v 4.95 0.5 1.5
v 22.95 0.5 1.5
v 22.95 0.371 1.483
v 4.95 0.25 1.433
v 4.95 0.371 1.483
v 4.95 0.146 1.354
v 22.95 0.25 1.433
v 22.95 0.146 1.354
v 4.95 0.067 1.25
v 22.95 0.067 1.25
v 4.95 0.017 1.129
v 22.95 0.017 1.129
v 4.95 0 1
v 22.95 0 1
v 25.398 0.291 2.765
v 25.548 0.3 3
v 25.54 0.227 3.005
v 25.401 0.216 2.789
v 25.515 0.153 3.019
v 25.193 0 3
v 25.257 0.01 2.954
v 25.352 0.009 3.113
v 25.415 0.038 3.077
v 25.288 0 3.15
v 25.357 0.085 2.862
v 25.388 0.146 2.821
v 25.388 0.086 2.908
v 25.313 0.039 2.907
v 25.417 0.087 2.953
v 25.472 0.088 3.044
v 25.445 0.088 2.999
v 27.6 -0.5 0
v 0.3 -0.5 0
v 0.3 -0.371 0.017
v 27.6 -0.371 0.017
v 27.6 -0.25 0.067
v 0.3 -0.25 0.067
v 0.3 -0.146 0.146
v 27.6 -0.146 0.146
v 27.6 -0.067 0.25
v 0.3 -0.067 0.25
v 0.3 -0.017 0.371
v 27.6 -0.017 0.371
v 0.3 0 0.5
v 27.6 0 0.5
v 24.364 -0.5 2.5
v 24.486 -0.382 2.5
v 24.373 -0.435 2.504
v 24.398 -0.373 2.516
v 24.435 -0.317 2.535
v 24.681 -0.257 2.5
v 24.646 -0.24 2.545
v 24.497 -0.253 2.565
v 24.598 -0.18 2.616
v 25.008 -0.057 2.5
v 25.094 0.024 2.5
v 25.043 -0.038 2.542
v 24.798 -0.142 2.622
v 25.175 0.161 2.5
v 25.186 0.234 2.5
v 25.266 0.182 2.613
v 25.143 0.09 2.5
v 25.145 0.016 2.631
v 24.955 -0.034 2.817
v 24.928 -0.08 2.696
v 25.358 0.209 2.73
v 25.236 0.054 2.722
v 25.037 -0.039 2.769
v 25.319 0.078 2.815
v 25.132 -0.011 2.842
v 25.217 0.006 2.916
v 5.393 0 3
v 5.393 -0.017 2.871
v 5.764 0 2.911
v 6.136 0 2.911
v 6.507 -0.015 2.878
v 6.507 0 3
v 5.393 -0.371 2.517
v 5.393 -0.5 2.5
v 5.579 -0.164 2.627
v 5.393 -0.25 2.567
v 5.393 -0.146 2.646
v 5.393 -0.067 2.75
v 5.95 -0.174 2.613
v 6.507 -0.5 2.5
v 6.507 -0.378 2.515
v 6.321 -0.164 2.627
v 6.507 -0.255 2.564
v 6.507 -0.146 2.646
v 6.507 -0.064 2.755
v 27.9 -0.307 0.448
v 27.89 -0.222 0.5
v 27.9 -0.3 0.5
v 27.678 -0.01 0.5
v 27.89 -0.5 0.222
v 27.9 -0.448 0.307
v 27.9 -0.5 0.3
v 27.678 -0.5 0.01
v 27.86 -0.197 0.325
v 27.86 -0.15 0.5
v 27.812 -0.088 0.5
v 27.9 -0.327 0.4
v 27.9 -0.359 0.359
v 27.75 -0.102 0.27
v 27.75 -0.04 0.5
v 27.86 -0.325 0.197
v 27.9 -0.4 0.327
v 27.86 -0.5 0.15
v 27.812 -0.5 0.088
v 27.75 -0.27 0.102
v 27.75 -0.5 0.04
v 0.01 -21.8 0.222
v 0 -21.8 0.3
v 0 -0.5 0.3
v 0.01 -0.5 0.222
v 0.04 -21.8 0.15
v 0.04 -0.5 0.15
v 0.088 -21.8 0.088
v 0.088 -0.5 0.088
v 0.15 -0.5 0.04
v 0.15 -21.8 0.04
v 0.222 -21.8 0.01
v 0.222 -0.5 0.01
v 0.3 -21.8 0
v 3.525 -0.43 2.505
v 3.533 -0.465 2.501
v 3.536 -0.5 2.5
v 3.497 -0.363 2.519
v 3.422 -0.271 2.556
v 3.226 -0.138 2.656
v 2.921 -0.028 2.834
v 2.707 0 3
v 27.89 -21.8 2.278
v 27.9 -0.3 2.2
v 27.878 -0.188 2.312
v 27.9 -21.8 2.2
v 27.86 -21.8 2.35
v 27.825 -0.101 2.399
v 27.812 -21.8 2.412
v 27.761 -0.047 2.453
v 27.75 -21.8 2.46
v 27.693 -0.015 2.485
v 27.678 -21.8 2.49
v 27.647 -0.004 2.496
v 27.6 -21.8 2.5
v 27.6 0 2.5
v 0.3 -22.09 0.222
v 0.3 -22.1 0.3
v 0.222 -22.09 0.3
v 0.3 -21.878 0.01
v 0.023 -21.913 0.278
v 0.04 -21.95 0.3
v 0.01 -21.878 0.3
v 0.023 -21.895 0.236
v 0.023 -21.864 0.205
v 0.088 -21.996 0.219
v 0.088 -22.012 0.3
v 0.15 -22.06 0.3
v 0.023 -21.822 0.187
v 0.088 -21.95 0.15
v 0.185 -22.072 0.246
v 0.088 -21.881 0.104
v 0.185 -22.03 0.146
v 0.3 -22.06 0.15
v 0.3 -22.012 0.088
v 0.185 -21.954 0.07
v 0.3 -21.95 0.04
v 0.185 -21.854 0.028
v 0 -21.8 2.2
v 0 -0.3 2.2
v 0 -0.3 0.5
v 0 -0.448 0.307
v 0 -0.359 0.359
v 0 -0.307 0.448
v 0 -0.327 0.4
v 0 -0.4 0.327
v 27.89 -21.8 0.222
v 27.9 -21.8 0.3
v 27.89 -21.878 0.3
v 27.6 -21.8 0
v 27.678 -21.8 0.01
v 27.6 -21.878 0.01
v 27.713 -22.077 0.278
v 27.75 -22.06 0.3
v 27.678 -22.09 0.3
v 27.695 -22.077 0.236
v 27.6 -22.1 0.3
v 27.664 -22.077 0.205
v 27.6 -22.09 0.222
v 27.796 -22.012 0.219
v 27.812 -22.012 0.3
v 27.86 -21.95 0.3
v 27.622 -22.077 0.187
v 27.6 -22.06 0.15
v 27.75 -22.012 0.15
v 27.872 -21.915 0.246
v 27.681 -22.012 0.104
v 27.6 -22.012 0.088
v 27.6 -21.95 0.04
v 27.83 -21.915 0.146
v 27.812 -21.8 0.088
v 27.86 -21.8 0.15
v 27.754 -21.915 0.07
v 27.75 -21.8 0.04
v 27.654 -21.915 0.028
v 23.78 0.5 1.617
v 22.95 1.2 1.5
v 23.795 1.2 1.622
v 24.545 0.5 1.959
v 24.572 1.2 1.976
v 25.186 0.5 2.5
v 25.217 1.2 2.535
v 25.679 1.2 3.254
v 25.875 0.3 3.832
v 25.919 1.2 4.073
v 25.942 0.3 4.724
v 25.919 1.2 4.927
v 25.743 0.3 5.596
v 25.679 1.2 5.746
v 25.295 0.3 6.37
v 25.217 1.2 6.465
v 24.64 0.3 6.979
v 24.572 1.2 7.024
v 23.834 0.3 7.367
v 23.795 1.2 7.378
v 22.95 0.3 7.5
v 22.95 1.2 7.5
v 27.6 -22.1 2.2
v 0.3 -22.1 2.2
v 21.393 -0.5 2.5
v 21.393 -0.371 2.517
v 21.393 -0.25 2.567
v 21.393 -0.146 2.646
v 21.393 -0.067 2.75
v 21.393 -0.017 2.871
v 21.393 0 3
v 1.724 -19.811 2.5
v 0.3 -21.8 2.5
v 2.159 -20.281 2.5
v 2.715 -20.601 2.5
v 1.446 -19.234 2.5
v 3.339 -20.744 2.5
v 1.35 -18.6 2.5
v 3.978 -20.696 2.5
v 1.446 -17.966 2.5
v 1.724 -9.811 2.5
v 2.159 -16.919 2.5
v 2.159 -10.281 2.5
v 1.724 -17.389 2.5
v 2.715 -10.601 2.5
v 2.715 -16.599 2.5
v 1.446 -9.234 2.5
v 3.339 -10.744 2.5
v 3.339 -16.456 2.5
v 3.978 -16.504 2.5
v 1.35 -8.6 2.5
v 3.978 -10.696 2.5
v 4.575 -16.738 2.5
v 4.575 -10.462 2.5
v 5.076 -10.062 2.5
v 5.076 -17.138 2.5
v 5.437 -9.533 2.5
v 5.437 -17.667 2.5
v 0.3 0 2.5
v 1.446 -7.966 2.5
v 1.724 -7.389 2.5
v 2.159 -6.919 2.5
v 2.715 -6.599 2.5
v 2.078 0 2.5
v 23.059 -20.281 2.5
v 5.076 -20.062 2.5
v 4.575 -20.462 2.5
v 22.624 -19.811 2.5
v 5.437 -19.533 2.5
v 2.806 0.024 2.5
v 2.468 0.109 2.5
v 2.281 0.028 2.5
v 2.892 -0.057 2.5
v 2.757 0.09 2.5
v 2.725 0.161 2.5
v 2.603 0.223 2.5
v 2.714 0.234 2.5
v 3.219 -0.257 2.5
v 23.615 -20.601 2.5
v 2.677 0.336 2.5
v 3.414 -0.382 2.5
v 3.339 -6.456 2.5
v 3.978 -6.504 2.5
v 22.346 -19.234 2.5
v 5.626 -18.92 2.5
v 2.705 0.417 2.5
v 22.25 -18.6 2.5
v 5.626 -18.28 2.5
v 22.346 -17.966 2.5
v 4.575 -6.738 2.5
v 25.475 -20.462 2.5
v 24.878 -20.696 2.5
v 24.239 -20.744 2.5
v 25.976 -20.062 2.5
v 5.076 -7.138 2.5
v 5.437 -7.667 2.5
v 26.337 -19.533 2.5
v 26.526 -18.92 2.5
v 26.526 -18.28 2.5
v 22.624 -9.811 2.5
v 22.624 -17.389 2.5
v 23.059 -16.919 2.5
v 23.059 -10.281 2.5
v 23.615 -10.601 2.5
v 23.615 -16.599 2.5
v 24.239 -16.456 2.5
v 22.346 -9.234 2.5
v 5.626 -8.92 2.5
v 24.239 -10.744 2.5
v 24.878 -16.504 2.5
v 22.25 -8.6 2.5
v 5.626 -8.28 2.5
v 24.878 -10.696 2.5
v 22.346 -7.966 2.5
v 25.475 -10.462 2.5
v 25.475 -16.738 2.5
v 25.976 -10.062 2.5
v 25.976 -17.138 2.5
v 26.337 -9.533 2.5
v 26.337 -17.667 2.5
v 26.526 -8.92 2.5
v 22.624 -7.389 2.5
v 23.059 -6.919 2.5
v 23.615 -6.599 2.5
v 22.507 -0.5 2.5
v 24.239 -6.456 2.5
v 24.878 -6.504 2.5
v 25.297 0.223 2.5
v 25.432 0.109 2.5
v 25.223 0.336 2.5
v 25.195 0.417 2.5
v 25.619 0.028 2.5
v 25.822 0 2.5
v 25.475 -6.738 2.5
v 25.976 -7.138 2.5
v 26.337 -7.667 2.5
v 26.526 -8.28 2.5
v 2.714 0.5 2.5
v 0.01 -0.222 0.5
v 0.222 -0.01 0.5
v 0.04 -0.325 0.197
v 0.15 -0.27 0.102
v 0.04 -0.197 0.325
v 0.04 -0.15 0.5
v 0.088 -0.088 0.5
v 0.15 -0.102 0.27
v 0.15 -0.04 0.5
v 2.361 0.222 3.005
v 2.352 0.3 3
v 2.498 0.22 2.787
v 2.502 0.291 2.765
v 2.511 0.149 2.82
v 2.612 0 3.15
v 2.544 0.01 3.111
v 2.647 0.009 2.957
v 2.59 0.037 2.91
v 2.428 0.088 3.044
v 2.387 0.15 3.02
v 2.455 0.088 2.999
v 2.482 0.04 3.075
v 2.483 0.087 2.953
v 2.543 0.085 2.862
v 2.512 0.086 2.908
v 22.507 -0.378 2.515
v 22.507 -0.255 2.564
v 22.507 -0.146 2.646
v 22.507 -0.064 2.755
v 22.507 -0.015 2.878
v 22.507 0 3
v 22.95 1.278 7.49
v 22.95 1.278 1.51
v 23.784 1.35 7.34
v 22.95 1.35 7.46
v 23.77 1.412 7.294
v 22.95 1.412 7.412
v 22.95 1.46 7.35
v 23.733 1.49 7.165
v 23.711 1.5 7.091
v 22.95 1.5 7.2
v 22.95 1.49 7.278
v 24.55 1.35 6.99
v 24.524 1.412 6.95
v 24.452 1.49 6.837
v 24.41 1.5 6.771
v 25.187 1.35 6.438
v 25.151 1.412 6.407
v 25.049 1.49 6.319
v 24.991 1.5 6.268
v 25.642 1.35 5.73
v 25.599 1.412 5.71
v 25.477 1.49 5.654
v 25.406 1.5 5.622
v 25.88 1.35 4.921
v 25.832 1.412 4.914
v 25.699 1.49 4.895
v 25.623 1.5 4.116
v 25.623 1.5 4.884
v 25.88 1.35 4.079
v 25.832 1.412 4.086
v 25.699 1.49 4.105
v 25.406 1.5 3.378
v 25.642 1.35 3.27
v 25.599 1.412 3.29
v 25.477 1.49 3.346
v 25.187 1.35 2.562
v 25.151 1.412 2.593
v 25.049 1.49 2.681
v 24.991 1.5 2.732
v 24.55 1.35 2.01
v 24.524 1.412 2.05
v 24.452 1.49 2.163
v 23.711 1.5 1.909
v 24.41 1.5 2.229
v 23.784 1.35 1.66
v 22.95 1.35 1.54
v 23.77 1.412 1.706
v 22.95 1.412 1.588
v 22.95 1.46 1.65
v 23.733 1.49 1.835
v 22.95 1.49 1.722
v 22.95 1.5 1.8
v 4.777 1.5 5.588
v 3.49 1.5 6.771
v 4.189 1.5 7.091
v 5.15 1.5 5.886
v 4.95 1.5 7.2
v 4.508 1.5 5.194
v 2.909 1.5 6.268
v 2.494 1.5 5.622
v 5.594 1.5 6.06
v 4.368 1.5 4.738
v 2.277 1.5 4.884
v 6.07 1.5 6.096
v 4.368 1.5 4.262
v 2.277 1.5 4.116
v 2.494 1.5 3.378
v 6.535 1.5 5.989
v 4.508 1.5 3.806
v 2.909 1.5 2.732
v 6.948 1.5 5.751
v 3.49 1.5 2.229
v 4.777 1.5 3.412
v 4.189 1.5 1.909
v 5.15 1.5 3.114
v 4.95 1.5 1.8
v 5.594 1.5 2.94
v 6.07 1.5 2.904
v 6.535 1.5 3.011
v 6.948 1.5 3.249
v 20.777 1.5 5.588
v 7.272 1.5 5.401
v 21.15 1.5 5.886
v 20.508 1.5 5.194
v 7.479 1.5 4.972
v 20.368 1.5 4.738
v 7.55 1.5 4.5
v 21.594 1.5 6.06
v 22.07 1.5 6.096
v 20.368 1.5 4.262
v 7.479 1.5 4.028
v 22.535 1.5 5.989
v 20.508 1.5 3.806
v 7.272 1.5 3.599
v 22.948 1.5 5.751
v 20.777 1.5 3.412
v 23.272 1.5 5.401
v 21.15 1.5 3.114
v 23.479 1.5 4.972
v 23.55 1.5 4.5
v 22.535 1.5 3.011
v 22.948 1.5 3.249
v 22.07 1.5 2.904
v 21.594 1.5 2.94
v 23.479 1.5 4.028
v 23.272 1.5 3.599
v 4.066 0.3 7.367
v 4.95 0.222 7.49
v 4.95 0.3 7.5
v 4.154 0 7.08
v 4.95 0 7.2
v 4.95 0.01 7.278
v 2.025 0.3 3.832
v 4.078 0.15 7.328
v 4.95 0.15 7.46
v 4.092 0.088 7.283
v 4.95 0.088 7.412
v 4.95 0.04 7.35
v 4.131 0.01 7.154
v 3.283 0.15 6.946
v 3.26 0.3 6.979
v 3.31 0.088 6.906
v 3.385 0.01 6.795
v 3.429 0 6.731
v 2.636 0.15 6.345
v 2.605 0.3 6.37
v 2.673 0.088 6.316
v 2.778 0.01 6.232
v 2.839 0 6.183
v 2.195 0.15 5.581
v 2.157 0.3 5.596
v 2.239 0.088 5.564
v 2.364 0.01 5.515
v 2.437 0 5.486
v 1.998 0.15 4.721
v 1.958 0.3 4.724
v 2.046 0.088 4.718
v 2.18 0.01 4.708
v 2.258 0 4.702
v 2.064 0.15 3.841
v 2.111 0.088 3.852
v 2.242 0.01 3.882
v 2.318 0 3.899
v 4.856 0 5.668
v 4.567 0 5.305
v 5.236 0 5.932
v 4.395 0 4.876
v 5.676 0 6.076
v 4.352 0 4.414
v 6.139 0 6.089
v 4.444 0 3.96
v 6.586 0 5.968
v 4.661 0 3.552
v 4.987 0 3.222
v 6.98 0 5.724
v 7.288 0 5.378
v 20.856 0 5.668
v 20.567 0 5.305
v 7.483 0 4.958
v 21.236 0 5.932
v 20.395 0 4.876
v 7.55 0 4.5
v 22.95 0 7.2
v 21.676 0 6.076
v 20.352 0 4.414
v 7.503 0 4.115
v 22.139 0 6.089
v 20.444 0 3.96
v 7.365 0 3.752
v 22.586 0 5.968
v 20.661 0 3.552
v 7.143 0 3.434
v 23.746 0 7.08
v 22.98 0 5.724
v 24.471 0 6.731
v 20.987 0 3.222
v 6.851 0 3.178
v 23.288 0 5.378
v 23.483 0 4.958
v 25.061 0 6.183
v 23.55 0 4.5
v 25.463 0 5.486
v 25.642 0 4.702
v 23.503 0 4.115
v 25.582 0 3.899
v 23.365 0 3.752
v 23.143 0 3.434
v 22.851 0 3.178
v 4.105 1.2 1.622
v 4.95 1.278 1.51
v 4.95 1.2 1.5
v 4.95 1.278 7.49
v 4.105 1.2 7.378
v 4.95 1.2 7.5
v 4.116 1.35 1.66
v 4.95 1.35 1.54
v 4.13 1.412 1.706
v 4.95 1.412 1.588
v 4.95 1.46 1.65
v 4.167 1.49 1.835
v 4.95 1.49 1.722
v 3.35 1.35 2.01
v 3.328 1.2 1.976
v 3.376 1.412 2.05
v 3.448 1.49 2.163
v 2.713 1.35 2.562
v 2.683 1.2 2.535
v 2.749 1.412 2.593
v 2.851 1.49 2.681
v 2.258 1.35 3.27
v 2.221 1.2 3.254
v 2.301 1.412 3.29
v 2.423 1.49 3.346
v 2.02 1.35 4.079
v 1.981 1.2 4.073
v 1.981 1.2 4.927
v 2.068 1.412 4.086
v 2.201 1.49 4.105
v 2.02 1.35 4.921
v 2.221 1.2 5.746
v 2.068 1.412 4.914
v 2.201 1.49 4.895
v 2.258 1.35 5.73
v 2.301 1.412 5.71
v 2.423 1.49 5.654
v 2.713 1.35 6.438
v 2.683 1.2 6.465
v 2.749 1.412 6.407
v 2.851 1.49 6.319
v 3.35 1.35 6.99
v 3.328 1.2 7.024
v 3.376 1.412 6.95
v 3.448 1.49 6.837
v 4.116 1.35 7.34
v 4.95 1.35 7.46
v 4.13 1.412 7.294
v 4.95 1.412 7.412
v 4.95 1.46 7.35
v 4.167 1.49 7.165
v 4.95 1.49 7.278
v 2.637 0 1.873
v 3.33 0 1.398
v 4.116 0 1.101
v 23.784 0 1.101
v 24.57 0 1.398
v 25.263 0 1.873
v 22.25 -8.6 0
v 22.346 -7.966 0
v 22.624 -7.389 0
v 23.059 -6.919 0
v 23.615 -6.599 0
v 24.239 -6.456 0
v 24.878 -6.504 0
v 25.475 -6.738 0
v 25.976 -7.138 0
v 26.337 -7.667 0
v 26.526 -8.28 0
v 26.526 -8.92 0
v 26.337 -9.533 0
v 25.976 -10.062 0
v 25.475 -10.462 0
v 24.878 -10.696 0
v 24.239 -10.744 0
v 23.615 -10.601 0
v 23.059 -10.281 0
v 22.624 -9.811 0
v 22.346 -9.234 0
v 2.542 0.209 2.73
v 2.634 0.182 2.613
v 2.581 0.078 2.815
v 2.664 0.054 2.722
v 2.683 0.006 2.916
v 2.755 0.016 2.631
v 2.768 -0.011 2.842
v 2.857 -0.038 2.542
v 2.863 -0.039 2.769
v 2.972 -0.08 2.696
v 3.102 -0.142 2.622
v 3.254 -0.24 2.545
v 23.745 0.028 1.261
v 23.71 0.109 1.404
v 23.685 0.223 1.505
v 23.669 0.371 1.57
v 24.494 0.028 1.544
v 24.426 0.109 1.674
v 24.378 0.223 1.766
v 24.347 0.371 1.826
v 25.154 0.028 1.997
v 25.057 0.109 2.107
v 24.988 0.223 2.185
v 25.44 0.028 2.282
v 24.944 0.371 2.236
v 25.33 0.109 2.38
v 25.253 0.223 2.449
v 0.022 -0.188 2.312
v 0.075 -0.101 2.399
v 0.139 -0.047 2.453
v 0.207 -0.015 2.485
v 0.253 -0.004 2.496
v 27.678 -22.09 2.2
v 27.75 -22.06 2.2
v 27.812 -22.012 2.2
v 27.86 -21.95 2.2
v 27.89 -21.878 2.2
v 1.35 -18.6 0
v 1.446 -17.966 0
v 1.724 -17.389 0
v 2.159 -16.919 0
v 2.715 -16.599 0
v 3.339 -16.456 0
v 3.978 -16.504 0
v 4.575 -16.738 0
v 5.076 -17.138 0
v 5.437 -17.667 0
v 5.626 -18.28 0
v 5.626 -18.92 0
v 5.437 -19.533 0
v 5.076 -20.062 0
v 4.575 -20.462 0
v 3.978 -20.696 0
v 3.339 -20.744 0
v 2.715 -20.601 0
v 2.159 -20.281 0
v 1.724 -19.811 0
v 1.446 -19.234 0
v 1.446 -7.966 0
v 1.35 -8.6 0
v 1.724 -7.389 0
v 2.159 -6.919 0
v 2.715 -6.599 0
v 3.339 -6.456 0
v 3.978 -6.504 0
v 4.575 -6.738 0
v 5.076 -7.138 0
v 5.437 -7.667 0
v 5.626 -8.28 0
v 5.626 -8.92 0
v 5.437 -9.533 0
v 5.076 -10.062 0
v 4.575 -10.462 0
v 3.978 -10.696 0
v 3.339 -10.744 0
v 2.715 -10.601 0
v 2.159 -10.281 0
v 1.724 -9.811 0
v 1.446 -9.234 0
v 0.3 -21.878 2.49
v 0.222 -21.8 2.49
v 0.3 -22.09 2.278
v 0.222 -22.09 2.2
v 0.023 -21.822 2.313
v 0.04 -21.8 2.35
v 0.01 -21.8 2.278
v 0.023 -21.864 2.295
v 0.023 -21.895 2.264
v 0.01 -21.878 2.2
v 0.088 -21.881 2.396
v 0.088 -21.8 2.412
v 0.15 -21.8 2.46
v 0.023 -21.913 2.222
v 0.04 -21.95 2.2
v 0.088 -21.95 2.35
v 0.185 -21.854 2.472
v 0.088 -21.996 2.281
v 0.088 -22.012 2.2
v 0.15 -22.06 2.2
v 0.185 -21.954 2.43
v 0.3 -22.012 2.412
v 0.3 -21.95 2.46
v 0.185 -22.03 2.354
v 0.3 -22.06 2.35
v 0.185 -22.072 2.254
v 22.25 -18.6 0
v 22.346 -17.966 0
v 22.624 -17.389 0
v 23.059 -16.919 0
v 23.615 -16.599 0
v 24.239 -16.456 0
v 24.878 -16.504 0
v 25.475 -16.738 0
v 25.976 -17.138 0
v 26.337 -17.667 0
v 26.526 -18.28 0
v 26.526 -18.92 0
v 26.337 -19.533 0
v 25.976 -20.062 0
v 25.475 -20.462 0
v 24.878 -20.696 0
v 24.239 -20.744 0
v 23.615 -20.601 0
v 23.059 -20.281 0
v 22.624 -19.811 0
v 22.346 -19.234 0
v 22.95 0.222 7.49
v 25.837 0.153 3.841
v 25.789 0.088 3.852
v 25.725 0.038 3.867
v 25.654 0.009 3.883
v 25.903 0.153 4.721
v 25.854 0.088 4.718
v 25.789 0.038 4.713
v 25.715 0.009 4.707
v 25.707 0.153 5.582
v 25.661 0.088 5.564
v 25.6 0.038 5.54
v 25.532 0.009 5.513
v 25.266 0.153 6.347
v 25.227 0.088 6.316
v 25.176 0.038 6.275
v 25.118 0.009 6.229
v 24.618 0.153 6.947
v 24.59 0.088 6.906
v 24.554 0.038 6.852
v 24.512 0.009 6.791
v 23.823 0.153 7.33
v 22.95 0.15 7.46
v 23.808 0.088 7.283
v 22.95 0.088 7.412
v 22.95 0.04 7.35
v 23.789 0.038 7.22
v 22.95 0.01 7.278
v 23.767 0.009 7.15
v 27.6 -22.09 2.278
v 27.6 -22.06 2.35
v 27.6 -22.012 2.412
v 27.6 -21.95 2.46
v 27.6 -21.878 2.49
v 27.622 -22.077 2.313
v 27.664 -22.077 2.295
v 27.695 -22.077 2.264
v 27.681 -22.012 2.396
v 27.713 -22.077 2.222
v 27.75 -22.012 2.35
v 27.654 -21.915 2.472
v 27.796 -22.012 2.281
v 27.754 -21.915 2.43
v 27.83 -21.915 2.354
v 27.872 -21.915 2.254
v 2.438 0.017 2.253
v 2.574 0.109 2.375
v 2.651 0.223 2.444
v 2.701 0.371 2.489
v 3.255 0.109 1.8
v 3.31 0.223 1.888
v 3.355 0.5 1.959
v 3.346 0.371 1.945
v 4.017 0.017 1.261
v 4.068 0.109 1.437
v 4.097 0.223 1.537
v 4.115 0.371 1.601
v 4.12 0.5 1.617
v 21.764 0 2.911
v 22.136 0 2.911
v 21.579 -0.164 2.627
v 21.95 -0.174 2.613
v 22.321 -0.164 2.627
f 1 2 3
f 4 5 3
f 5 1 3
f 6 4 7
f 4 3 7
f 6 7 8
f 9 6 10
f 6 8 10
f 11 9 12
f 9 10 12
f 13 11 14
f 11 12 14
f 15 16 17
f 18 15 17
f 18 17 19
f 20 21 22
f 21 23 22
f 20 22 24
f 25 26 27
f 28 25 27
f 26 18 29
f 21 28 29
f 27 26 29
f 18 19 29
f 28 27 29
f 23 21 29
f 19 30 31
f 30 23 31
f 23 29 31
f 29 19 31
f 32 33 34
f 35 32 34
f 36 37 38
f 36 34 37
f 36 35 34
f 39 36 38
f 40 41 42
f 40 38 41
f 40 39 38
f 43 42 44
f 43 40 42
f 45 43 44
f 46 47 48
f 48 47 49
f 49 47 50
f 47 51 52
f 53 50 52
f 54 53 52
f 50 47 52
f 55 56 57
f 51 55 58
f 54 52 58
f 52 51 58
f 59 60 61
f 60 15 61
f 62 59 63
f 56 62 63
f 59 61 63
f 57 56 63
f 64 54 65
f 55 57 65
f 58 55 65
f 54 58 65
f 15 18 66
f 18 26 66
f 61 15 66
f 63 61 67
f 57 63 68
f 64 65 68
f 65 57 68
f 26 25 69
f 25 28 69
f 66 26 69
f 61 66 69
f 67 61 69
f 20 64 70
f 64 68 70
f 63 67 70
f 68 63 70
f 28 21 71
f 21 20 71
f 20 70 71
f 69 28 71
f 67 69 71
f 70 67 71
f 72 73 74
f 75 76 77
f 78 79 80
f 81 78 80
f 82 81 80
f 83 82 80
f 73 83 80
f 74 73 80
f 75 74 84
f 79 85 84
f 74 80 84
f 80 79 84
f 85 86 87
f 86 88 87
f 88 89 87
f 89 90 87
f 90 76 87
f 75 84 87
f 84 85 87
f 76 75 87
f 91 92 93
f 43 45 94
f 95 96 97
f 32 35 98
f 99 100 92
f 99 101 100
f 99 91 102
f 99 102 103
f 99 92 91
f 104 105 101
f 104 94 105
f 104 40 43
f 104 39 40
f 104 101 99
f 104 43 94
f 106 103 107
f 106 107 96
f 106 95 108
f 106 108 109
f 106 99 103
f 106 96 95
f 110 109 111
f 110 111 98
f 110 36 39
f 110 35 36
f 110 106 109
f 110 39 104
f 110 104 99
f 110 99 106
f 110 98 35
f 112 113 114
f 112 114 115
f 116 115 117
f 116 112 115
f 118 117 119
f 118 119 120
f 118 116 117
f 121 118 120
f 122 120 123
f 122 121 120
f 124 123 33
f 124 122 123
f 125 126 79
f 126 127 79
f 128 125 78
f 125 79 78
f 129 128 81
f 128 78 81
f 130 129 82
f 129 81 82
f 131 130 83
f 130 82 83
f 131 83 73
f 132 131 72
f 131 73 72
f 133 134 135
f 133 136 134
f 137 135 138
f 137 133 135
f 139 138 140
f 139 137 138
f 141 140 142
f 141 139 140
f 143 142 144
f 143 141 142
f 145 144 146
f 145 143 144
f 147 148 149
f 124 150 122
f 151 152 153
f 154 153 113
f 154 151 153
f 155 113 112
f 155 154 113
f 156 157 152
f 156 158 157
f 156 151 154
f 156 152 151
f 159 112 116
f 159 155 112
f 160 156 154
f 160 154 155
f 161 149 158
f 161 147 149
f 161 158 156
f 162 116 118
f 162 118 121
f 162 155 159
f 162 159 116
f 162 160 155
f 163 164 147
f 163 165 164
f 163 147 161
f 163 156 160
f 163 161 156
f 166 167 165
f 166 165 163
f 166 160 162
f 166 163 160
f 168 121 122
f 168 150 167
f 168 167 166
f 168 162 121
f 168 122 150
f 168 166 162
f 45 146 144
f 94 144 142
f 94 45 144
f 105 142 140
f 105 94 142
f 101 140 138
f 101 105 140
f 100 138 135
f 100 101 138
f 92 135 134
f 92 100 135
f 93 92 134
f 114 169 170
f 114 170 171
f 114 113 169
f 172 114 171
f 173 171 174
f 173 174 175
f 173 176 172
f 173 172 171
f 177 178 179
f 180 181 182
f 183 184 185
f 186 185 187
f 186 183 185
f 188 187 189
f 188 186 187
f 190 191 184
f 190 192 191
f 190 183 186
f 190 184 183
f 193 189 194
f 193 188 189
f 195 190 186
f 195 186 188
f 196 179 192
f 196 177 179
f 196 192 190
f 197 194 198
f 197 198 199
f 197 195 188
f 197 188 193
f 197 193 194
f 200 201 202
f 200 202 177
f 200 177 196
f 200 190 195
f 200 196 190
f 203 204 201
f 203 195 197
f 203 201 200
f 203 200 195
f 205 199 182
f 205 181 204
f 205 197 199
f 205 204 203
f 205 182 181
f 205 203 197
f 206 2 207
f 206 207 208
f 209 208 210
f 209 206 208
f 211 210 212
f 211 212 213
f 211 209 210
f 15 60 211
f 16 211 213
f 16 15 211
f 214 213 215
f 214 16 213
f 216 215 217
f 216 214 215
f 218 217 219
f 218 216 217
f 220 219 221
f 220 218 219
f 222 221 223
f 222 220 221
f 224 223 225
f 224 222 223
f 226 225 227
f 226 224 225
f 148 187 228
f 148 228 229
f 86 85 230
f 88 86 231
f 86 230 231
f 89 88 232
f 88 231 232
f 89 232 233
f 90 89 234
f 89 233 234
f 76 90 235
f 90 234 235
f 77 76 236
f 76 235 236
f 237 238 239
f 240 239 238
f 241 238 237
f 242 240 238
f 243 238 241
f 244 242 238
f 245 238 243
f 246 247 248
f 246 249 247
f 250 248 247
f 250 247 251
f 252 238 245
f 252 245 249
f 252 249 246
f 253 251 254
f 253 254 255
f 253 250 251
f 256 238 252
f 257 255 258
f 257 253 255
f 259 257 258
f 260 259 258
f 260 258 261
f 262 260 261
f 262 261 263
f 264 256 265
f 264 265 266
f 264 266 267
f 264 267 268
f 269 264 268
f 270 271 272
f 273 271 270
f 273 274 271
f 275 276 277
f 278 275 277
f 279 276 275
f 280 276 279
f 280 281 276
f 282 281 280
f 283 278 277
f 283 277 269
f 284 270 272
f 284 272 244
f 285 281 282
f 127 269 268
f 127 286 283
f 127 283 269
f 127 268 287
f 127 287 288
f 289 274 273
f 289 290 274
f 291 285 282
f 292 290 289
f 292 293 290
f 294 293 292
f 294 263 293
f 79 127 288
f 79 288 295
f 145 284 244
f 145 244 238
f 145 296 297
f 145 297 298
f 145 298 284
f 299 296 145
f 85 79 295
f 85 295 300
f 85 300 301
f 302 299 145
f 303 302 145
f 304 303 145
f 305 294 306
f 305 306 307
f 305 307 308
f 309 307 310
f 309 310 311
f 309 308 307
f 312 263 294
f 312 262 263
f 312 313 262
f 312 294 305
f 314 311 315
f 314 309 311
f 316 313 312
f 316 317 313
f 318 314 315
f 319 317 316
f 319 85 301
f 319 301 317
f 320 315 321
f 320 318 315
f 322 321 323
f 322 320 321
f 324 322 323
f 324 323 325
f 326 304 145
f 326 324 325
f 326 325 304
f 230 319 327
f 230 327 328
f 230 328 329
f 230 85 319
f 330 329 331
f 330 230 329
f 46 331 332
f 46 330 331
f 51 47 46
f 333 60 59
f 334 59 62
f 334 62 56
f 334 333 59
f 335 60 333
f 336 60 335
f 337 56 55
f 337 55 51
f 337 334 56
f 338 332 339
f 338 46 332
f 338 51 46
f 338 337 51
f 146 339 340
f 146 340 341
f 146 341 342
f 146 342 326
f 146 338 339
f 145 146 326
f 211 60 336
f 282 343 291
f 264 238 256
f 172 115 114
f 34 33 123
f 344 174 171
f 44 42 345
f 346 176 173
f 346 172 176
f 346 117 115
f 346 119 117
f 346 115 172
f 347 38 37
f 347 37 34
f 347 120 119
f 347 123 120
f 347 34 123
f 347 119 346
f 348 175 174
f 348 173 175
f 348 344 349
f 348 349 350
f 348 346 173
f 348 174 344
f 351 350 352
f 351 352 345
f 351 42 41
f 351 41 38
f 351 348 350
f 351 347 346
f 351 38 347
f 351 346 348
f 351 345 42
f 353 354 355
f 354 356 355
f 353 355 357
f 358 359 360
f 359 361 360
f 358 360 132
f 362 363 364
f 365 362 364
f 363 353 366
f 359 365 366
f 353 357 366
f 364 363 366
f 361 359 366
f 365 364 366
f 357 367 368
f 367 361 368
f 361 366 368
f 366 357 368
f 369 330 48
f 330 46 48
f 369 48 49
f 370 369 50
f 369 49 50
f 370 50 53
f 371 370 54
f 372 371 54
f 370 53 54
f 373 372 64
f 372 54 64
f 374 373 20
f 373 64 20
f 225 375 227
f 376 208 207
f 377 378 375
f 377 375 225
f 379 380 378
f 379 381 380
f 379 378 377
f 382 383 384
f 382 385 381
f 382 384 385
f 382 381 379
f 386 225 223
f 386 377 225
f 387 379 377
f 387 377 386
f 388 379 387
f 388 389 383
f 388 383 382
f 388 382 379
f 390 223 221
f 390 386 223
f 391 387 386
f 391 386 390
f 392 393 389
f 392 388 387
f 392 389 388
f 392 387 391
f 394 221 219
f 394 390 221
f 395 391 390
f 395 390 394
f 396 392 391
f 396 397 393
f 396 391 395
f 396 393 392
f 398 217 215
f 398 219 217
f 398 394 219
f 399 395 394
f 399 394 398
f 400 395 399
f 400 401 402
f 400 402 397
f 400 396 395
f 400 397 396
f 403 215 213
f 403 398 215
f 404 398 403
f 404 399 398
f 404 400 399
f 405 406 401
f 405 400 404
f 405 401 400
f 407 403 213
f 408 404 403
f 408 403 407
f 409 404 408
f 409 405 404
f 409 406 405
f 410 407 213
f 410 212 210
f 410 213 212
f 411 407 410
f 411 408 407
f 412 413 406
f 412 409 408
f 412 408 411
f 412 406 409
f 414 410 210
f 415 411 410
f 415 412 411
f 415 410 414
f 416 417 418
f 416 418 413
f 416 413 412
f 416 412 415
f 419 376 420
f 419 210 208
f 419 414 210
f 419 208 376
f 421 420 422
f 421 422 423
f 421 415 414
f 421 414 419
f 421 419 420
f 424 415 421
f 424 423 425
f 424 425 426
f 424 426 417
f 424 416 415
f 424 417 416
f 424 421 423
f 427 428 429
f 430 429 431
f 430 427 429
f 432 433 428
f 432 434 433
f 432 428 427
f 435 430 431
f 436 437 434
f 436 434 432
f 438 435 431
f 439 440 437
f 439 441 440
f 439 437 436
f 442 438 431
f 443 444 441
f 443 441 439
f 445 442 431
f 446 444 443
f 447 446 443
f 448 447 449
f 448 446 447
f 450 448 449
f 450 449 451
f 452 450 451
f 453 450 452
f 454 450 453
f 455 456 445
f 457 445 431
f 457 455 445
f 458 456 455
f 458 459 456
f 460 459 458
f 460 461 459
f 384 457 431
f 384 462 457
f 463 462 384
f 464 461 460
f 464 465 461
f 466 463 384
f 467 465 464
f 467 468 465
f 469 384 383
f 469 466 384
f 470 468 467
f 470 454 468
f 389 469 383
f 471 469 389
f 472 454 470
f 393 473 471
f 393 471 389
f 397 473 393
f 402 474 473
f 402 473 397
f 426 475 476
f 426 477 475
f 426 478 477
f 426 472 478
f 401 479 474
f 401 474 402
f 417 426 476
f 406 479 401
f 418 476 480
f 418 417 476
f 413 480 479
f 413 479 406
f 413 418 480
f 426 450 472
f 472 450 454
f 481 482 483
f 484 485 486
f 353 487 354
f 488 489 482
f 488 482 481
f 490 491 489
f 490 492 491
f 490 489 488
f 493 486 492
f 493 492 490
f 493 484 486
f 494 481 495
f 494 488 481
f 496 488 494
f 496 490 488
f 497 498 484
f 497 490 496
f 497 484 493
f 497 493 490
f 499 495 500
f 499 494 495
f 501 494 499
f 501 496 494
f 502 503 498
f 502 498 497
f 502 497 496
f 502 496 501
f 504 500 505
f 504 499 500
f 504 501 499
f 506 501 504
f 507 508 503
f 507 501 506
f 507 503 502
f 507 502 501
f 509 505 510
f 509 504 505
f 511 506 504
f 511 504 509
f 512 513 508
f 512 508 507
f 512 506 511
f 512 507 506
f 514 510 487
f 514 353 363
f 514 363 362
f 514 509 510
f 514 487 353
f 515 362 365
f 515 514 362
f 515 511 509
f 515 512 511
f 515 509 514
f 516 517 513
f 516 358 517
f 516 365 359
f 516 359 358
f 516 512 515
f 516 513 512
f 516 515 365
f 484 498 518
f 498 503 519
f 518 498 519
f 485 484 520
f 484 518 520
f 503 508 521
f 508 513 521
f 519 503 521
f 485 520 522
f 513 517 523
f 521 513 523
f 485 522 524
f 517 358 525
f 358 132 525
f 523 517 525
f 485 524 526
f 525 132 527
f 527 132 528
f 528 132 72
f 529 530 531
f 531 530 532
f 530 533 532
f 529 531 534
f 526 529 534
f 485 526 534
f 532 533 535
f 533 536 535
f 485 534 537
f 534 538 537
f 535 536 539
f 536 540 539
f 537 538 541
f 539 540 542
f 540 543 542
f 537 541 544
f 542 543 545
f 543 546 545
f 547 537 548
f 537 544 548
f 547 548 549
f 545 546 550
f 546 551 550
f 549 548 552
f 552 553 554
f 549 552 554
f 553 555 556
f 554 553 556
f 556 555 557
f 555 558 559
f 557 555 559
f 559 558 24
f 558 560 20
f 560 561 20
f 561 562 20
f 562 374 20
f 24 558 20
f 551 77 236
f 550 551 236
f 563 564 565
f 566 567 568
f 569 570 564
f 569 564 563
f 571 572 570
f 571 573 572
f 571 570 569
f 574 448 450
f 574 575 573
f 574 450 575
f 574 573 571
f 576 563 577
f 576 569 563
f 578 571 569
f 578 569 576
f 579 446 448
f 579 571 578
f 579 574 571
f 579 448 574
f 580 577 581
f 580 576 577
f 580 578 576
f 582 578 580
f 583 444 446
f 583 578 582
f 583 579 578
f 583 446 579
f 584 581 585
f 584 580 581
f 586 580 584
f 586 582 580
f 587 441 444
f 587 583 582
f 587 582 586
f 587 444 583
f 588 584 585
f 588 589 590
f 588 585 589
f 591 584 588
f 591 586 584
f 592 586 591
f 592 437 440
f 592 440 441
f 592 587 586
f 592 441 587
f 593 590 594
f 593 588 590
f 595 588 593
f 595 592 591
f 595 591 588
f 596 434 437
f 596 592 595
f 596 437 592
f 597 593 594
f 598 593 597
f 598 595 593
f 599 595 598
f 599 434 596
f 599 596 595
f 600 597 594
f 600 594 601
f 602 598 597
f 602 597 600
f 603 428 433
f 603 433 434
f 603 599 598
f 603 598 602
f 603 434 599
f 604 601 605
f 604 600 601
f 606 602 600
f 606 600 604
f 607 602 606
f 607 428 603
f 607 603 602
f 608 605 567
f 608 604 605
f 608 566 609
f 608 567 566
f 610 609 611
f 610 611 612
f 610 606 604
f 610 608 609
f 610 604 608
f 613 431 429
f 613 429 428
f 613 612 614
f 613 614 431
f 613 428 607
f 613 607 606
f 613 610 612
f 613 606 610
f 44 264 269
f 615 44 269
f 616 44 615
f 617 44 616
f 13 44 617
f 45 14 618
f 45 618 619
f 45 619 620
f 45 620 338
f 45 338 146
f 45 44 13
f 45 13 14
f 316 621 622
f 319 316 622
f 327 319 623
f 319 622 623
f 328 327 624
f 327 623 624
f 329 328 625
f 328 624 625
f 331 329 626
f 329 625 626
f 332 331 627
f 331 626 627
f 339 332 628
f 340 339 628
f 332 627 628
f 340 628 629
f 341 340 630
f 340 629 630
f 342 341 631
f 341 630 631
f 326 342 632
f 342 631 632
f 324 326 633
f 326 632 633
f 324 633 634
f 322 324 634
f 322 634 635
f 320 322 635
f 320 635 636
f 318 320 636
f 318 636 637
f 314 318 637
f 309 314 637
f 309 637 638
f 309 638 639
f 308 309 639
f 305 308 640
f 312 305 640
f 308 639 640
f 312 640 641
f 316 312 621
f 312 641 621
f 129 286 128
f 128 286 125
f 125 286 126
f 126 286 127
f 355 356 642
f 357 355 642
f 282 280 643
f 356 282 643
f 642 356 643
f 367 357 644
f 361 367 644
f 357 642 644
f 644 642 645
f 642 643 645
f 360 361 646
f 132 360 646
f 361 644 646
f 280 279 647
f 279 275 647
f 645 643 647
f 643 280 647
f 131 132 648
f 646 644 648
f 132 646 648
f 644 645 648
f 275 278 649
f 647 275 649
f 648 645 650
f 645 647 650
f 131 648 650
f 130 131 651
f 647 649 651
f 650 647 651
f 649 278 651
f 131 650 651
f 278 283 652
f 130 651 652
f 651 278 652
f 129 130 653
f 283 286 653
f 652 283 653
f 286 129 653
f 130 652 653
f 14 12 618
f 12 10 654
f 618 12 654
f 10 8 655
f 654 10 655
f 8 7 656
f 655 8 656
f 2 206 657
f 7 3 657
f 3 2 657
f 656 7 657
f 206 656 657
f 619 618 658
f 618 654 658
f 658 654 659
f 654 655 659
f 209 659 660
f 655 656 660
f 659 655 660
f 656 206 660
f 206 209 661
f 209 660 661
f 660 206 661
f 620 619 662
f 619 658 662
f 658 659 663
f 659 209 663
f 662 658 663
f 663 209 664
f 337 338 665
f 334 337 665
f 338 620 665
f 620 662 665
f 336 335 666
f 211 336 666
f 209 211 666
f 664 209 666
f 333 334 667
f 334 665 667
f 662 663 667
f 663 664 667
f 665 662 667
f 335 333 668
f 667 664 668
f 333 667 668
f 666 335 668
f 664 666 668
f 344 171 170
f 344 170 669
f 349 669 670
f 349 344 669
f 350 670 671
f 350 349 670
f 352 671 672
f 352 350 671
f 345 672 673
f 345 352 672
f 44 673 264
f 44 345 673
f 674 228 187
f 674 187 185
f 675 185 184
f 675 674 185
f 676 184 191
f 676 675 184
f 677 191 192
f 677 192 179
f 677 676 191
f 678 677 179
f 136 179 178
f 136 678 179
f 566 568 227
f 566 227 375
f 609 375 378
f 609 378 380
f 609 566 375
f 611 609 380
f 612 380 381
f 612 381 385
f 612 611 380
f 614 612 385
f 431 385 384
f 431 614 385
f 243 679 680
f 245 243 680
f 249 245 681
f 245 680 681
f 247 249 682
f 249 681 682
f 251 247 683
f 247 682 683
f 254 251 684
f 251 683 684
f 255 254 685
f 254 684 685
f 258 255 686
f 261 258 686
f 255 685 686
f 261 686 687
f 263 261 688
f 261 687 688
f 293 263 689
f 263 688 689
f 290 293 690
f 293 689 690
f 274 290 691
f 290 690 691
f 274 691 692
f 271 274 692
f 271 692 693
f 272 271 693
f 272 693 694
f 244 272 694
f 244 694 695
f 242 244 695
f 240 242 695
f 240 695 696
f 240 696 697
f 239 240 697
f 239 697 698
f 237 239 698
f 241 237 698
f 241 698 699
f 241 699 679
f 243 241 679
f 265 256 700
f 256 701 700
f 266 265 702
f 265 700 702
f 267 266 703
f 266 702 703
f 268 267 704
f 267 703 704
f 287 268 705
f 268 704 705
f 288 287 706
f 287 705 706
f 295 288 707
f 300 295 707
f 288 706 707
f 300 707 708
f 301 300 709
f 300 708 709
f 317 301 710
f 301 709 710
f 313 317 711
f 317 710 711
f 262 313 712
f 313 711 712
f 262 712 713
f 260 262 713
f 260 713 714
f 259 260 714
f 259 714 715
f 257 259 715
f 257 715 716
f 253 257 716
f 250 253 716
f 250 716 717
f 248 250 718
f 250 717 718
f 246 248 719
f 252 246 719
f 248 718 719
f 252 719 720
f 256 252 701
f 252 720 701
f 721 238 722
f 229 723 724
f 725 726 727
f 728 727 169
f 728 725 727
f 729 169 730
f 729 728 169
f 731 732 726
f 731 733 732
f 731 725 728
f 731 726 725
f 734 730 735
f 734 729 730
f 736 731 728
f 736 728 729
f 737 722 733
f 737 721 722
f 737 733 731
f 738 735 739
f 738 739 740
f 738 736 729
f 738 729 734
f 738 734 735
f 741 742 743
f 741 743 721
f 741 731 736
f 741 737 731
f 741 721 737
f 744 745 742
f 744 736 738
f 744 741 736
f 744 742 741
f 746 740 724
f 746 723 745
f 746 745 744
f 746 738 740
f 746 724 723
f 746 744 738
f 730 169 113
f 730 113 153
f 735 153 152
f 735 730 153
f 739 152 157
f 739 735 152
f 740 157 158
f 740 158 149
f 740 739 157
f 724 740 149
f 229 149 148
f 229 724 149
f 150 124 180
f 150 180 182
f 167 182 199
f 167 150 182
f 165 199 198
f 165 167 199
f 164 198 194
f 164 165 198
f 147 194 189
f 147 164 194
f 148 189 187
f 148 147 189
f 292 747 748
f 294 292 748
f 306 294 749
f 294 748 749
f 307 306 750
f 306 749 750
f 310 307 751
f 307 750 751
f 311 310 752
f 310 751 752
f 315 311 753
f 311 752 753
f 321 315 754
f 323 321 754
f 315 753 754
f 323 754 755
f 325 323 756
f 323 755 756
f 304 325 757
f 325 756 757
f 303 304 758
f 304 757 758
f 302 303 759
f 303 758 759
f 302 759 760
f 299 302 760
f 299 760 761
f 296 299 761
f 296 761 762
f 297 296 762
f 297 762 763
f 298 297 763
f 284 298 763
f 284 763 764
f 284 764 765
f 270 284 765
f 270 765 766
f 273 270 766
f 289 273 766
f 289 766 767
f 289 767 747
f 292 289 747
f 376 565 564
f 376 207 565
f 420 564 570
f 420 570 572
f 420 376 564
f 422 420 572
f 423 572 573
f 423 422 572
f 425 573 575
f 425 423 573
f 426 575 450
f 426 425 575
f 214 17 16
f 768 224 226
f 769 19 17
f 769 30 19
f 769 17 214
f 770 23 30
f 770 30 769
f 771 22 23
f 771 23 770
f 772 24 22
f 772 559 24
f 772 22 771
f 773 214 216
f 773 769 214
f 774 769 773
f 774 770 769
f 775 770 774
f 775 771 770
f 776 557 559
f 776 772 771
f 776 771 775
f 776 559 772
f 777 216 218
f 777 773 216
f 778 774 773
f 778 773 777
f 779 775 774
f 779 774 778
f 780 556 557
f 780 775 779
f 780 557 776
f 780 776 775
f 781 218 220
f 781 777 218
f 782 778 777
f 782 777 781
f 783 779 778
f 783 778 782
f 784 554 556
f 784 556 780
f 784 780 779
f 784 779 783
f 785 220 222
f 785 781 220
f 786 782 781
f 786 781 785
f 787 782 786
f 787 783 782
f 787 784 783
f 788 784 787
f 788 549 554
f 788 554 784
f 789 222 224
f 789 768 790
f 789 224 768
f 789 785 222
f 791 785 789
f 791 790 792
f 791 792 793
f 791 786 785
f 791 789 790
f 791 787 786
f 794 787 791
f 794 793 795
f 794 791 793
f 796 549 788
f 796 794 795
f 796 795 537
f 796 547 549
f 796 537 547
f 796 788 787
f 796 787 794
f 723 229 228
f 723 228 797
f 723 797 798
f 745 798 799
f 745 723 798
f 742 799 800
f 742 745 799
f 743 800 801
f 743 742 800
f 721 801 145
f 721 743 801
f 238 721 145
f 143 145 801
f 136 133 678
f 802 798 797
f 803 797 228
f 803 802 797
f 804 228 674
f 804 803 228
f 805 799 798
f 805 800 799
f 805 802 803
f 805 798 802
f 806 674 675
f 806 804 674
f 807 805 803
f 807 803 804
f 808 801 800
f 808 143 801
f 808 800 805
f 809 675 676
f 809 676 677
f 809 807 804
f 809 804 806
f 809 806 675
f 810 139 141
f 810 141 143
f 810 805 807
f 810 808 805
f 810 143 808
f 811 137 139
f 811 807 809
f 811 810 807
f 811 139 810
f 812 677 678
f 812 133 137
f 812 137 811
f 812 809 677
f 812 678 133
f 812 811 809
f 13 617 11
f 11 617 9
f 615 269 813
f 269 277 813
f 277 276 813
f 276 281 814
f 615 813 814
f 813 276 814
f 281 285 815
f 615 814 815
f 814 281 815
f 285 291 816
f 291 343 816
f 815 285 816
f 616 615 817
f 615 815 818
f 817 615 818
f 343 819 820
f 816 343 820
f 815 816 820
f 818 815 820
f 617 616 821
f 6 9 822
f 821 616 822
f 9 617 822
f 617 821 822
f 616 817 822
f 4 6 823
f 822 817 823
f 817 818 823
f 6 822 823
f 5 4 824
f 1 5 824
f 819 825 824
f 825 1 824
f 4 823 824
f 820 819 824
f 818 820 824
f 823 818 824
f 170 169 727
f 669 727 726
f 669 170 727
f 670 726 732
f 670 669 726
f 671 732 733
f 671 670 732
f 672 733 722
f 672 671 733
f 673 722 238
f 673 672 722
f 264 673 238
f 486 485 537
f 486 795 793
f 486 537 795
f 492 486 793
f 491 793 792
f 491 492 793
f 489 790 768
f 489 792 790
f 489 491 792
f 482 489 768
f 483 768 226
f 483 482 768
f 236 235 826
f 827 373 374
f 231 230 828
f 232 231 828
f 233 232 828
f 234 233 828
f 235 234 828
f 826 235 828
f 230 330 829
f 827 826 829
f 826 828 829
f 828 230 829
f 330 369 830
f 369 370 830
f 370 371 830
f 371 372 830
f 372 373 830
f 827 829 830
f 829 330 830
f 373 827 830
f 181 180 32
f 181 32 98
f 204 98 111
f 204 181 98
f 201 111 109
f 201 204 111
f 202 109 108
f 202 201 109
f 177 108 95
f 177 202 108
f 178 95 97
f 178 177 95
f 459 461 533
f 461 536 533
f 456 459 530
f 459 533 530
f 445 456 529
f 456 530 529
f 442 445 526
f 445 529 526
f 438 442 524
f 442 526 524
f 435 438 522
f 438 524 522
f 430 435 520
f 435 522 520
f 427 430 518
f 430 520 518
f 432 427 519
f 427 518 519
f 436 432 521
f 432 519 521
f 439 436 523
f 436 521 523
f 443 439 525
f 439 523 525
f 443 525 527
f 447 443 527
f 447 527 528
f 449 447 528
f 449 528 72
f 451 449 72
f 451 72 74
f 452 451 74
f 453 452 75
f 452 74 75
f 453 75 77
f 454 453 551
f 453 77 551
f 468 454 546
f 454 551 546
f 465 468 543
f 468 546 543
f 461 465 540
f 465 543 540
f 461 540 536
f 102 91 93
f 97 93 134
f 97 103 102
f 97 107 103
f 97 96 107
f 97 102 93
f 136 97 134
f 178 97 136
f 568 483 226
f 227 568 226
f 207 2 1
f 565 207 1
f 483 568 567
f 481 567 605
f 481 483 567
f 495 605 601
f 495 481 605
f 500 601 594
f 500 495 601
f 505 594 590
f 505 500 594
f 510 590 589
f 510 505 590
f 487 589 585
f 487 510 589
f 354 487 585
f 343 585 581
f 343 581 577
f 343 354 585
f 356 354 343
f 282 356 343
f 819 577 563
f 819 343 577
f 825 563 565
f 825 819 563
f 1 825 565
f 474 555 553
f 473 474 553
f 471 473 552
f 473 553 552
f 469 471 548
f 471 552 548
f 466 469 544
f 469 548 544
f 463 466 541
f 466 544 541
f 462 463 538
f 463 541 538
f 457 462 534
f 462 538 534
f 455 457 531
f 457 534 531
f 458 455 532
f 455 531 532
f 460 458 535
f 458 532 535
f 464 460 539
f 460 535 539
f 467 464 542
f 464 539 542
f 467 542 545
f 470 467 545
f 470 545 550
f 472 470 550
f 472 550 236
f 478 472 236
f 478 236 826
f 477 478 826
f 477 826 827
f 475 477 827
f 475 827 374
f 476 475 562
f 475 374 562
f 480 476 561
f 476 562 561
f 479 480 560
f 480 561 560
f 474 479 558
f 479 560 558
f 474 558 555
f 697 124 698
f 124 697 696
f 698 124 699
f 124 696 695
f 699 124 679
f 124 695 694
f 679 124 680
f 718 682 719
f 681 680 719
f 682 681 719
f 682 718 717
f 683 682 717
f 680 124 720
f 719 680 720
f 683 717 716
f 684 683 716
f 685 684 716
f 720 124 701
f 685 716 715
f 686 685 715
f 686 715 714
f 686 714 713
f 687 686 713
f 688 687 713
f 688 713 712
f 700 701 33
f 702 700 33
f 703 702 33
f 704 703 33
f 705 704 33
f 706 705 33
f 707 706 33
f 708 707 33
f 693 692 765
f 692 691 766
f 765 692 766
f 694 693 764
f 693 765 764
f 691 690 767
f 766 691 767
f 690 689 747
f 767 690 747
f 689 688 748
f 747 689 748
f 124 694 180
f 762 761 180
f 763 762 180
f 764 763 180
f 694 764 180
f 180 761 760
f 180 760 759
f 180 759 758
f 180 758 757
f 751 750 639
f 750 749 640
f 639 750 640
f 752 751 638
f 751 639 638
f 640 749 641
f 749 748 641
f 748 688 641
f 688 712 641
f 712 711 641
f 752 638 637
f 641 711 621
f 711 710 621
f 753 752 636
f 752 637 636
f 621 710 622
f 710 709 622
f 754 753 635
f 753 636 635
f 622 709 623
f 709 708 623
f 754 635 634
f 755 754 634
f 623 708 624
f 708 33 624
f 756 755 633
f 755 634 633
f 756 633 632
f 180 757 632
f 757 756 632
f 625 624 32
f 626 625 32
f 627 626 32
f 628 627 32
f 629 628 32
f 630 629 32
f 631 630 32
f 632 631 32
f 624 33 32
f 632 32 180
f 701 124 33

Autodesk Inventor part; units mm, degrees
ref_plane "YZ Plane" through (0, 0, 0) normal (1, 0, 0) x (0, 1, 0)
ref_plane "XZ Plane" through (0, 0, 0) normal (0, 1, 0) x (-1, 0, 0)
ref_plane "XY Plane" through (0, 0, 0) normal (0, 0, 1) x (1, 0, 0)
sketch "Sketch1" plane through (0, 0, 0) normal (0, 0, 1) x (1, 0, 0)
  line L0 (0, 0) -> (27.9, 0)
  line L1 (27.9, 0) -> (27.9, -22.1)
  line L2 (27.9, -22.1) -> (0, -22.1)
  line L3 (0, -22.1) -> (0, 0)
  dimension "d0" = 27.9
  dimension "d1" = 22.1
extrude "Extrusion1" add sketch "Sketch1" along normal blind 2.5
sketch "Sketch2" plane through (0, 0, 0) normal (0, 1, 0) x (1, 0, 0)
  line L0 (1.95, -4.5) -> (25.95, -4.5) construction
  line L1 (4.95, -7.5) -> (22.95, -7.5)
  line L2 (22.95, -1.5) -> (4.95, -1.5)
  arc A0 (4.95, -1.5) -> (4.95, -7.5) centre (4.95, -4.5) ccw
  arc A1 (22.95, -7.5) -> (22.95, -1.5) centre (22.95, -4.5) ccw
  line L3 (27.9, 0) -> (27.9, -2.5) projected
  line L4 (0, 0) -> (0, -2.5) projected
  line L5 (27.9, -2.5) -> (0, -2.5) projected
  circle A2 centre (5.95, -4.5) radius 1.6
  circle A3 centre (21.95, -4.5) radius 1.6
  line L6 (4.752, -3.4394) -> (4.752, -5.5606)
  line L7 (0, 0) -> (27.9, 0) projected
  line L8 (13.95, 0) -> (13.95, -7.0714)
  point P0 (13.95, -4.5)
  dimension "d4" = 6
  dimension "d5" = 24
  dimension "d8" = 1
  dimension "d9" = 3.2
  dimension "d10" = 3.2
  dimension "d11" = 16
  dimension "d12" = 8
extrude "Extrusion2" add sketch "Sketch2" along normal blind 1.5 contours A0 L5 A1 L1 | A0 L2 L8 L5 | L5 L8 L2 A1
fillet "Fillet1" radius 0.3 4 edges at (1.95, 1.5, 4.5) (13.95, 1.5, 7.5) (25.95, 1.5, 4.5) (13.95, 1.5, 1.5)
fillet "Fillet2" radius 0.5 3 edges at (13.95, 0, 1.5) (13.95, 0, 0) (13.95, 0, 2.5)
fillet "Fillet3" radius 0.3 3 edges at (25.5481, 0, 6) (2.3519, 0, 6) (13.95, 0, 7.5)
sketch "Sketch3" plane through (0, 0, 0) normal (0, 0, -1) x (-1, 0, 0)
  circle A0 centre (-24.4, -18.6) radius 2.15
  line L0 (-27.9, -22.1) -> (-27.9, -0.5) projected
  line L1 (0, -22.1) -> (-27.9, -22.1) projected
  line L2 (-13.95, -22.1) -> (-13.95, -20.8715)
  circle A1 centre (-24.4, -8.6) radius 2.15
  line L3 (0, 0) -> (-27.9, 0) projected
  circle A2 centre (-3.5, -18.6) radius 2.15
  circle A3 centre (-3.5, -8.6) radius 2.15
  point P0 (-27.9, -11.3)
  point P1 (0, -11.3)
  dimension "d19" = 4.3
  dimension "d23" = 3.5
  dimension "d28" = 8.6
  dimension "d29" = 3.5
  dimension "d30" = 4.3
  dimension "d31" = 3.5
fillet "Fillet4" radius 0.3 12 edges at (27.9, -0.1464, 0.1464) (27.9, 0, 1.5) (27.9, -11.3, 0) (27.9, -11.05, 2.5) (13.95, -22.1, 0) (27.9, -22.1, 1.25) (13.95, -22.1, 2.5) (0, -22.1, 1.25) (0, -0.1464, 0.1464) (0, 0, 1.5) (0, -11.3, 0) (0, -11.05, 2.5)
extrude "Extrusion3" cut sketch "Sketch3" against normal blind 5
properties part number "distance_sensor_hold"
